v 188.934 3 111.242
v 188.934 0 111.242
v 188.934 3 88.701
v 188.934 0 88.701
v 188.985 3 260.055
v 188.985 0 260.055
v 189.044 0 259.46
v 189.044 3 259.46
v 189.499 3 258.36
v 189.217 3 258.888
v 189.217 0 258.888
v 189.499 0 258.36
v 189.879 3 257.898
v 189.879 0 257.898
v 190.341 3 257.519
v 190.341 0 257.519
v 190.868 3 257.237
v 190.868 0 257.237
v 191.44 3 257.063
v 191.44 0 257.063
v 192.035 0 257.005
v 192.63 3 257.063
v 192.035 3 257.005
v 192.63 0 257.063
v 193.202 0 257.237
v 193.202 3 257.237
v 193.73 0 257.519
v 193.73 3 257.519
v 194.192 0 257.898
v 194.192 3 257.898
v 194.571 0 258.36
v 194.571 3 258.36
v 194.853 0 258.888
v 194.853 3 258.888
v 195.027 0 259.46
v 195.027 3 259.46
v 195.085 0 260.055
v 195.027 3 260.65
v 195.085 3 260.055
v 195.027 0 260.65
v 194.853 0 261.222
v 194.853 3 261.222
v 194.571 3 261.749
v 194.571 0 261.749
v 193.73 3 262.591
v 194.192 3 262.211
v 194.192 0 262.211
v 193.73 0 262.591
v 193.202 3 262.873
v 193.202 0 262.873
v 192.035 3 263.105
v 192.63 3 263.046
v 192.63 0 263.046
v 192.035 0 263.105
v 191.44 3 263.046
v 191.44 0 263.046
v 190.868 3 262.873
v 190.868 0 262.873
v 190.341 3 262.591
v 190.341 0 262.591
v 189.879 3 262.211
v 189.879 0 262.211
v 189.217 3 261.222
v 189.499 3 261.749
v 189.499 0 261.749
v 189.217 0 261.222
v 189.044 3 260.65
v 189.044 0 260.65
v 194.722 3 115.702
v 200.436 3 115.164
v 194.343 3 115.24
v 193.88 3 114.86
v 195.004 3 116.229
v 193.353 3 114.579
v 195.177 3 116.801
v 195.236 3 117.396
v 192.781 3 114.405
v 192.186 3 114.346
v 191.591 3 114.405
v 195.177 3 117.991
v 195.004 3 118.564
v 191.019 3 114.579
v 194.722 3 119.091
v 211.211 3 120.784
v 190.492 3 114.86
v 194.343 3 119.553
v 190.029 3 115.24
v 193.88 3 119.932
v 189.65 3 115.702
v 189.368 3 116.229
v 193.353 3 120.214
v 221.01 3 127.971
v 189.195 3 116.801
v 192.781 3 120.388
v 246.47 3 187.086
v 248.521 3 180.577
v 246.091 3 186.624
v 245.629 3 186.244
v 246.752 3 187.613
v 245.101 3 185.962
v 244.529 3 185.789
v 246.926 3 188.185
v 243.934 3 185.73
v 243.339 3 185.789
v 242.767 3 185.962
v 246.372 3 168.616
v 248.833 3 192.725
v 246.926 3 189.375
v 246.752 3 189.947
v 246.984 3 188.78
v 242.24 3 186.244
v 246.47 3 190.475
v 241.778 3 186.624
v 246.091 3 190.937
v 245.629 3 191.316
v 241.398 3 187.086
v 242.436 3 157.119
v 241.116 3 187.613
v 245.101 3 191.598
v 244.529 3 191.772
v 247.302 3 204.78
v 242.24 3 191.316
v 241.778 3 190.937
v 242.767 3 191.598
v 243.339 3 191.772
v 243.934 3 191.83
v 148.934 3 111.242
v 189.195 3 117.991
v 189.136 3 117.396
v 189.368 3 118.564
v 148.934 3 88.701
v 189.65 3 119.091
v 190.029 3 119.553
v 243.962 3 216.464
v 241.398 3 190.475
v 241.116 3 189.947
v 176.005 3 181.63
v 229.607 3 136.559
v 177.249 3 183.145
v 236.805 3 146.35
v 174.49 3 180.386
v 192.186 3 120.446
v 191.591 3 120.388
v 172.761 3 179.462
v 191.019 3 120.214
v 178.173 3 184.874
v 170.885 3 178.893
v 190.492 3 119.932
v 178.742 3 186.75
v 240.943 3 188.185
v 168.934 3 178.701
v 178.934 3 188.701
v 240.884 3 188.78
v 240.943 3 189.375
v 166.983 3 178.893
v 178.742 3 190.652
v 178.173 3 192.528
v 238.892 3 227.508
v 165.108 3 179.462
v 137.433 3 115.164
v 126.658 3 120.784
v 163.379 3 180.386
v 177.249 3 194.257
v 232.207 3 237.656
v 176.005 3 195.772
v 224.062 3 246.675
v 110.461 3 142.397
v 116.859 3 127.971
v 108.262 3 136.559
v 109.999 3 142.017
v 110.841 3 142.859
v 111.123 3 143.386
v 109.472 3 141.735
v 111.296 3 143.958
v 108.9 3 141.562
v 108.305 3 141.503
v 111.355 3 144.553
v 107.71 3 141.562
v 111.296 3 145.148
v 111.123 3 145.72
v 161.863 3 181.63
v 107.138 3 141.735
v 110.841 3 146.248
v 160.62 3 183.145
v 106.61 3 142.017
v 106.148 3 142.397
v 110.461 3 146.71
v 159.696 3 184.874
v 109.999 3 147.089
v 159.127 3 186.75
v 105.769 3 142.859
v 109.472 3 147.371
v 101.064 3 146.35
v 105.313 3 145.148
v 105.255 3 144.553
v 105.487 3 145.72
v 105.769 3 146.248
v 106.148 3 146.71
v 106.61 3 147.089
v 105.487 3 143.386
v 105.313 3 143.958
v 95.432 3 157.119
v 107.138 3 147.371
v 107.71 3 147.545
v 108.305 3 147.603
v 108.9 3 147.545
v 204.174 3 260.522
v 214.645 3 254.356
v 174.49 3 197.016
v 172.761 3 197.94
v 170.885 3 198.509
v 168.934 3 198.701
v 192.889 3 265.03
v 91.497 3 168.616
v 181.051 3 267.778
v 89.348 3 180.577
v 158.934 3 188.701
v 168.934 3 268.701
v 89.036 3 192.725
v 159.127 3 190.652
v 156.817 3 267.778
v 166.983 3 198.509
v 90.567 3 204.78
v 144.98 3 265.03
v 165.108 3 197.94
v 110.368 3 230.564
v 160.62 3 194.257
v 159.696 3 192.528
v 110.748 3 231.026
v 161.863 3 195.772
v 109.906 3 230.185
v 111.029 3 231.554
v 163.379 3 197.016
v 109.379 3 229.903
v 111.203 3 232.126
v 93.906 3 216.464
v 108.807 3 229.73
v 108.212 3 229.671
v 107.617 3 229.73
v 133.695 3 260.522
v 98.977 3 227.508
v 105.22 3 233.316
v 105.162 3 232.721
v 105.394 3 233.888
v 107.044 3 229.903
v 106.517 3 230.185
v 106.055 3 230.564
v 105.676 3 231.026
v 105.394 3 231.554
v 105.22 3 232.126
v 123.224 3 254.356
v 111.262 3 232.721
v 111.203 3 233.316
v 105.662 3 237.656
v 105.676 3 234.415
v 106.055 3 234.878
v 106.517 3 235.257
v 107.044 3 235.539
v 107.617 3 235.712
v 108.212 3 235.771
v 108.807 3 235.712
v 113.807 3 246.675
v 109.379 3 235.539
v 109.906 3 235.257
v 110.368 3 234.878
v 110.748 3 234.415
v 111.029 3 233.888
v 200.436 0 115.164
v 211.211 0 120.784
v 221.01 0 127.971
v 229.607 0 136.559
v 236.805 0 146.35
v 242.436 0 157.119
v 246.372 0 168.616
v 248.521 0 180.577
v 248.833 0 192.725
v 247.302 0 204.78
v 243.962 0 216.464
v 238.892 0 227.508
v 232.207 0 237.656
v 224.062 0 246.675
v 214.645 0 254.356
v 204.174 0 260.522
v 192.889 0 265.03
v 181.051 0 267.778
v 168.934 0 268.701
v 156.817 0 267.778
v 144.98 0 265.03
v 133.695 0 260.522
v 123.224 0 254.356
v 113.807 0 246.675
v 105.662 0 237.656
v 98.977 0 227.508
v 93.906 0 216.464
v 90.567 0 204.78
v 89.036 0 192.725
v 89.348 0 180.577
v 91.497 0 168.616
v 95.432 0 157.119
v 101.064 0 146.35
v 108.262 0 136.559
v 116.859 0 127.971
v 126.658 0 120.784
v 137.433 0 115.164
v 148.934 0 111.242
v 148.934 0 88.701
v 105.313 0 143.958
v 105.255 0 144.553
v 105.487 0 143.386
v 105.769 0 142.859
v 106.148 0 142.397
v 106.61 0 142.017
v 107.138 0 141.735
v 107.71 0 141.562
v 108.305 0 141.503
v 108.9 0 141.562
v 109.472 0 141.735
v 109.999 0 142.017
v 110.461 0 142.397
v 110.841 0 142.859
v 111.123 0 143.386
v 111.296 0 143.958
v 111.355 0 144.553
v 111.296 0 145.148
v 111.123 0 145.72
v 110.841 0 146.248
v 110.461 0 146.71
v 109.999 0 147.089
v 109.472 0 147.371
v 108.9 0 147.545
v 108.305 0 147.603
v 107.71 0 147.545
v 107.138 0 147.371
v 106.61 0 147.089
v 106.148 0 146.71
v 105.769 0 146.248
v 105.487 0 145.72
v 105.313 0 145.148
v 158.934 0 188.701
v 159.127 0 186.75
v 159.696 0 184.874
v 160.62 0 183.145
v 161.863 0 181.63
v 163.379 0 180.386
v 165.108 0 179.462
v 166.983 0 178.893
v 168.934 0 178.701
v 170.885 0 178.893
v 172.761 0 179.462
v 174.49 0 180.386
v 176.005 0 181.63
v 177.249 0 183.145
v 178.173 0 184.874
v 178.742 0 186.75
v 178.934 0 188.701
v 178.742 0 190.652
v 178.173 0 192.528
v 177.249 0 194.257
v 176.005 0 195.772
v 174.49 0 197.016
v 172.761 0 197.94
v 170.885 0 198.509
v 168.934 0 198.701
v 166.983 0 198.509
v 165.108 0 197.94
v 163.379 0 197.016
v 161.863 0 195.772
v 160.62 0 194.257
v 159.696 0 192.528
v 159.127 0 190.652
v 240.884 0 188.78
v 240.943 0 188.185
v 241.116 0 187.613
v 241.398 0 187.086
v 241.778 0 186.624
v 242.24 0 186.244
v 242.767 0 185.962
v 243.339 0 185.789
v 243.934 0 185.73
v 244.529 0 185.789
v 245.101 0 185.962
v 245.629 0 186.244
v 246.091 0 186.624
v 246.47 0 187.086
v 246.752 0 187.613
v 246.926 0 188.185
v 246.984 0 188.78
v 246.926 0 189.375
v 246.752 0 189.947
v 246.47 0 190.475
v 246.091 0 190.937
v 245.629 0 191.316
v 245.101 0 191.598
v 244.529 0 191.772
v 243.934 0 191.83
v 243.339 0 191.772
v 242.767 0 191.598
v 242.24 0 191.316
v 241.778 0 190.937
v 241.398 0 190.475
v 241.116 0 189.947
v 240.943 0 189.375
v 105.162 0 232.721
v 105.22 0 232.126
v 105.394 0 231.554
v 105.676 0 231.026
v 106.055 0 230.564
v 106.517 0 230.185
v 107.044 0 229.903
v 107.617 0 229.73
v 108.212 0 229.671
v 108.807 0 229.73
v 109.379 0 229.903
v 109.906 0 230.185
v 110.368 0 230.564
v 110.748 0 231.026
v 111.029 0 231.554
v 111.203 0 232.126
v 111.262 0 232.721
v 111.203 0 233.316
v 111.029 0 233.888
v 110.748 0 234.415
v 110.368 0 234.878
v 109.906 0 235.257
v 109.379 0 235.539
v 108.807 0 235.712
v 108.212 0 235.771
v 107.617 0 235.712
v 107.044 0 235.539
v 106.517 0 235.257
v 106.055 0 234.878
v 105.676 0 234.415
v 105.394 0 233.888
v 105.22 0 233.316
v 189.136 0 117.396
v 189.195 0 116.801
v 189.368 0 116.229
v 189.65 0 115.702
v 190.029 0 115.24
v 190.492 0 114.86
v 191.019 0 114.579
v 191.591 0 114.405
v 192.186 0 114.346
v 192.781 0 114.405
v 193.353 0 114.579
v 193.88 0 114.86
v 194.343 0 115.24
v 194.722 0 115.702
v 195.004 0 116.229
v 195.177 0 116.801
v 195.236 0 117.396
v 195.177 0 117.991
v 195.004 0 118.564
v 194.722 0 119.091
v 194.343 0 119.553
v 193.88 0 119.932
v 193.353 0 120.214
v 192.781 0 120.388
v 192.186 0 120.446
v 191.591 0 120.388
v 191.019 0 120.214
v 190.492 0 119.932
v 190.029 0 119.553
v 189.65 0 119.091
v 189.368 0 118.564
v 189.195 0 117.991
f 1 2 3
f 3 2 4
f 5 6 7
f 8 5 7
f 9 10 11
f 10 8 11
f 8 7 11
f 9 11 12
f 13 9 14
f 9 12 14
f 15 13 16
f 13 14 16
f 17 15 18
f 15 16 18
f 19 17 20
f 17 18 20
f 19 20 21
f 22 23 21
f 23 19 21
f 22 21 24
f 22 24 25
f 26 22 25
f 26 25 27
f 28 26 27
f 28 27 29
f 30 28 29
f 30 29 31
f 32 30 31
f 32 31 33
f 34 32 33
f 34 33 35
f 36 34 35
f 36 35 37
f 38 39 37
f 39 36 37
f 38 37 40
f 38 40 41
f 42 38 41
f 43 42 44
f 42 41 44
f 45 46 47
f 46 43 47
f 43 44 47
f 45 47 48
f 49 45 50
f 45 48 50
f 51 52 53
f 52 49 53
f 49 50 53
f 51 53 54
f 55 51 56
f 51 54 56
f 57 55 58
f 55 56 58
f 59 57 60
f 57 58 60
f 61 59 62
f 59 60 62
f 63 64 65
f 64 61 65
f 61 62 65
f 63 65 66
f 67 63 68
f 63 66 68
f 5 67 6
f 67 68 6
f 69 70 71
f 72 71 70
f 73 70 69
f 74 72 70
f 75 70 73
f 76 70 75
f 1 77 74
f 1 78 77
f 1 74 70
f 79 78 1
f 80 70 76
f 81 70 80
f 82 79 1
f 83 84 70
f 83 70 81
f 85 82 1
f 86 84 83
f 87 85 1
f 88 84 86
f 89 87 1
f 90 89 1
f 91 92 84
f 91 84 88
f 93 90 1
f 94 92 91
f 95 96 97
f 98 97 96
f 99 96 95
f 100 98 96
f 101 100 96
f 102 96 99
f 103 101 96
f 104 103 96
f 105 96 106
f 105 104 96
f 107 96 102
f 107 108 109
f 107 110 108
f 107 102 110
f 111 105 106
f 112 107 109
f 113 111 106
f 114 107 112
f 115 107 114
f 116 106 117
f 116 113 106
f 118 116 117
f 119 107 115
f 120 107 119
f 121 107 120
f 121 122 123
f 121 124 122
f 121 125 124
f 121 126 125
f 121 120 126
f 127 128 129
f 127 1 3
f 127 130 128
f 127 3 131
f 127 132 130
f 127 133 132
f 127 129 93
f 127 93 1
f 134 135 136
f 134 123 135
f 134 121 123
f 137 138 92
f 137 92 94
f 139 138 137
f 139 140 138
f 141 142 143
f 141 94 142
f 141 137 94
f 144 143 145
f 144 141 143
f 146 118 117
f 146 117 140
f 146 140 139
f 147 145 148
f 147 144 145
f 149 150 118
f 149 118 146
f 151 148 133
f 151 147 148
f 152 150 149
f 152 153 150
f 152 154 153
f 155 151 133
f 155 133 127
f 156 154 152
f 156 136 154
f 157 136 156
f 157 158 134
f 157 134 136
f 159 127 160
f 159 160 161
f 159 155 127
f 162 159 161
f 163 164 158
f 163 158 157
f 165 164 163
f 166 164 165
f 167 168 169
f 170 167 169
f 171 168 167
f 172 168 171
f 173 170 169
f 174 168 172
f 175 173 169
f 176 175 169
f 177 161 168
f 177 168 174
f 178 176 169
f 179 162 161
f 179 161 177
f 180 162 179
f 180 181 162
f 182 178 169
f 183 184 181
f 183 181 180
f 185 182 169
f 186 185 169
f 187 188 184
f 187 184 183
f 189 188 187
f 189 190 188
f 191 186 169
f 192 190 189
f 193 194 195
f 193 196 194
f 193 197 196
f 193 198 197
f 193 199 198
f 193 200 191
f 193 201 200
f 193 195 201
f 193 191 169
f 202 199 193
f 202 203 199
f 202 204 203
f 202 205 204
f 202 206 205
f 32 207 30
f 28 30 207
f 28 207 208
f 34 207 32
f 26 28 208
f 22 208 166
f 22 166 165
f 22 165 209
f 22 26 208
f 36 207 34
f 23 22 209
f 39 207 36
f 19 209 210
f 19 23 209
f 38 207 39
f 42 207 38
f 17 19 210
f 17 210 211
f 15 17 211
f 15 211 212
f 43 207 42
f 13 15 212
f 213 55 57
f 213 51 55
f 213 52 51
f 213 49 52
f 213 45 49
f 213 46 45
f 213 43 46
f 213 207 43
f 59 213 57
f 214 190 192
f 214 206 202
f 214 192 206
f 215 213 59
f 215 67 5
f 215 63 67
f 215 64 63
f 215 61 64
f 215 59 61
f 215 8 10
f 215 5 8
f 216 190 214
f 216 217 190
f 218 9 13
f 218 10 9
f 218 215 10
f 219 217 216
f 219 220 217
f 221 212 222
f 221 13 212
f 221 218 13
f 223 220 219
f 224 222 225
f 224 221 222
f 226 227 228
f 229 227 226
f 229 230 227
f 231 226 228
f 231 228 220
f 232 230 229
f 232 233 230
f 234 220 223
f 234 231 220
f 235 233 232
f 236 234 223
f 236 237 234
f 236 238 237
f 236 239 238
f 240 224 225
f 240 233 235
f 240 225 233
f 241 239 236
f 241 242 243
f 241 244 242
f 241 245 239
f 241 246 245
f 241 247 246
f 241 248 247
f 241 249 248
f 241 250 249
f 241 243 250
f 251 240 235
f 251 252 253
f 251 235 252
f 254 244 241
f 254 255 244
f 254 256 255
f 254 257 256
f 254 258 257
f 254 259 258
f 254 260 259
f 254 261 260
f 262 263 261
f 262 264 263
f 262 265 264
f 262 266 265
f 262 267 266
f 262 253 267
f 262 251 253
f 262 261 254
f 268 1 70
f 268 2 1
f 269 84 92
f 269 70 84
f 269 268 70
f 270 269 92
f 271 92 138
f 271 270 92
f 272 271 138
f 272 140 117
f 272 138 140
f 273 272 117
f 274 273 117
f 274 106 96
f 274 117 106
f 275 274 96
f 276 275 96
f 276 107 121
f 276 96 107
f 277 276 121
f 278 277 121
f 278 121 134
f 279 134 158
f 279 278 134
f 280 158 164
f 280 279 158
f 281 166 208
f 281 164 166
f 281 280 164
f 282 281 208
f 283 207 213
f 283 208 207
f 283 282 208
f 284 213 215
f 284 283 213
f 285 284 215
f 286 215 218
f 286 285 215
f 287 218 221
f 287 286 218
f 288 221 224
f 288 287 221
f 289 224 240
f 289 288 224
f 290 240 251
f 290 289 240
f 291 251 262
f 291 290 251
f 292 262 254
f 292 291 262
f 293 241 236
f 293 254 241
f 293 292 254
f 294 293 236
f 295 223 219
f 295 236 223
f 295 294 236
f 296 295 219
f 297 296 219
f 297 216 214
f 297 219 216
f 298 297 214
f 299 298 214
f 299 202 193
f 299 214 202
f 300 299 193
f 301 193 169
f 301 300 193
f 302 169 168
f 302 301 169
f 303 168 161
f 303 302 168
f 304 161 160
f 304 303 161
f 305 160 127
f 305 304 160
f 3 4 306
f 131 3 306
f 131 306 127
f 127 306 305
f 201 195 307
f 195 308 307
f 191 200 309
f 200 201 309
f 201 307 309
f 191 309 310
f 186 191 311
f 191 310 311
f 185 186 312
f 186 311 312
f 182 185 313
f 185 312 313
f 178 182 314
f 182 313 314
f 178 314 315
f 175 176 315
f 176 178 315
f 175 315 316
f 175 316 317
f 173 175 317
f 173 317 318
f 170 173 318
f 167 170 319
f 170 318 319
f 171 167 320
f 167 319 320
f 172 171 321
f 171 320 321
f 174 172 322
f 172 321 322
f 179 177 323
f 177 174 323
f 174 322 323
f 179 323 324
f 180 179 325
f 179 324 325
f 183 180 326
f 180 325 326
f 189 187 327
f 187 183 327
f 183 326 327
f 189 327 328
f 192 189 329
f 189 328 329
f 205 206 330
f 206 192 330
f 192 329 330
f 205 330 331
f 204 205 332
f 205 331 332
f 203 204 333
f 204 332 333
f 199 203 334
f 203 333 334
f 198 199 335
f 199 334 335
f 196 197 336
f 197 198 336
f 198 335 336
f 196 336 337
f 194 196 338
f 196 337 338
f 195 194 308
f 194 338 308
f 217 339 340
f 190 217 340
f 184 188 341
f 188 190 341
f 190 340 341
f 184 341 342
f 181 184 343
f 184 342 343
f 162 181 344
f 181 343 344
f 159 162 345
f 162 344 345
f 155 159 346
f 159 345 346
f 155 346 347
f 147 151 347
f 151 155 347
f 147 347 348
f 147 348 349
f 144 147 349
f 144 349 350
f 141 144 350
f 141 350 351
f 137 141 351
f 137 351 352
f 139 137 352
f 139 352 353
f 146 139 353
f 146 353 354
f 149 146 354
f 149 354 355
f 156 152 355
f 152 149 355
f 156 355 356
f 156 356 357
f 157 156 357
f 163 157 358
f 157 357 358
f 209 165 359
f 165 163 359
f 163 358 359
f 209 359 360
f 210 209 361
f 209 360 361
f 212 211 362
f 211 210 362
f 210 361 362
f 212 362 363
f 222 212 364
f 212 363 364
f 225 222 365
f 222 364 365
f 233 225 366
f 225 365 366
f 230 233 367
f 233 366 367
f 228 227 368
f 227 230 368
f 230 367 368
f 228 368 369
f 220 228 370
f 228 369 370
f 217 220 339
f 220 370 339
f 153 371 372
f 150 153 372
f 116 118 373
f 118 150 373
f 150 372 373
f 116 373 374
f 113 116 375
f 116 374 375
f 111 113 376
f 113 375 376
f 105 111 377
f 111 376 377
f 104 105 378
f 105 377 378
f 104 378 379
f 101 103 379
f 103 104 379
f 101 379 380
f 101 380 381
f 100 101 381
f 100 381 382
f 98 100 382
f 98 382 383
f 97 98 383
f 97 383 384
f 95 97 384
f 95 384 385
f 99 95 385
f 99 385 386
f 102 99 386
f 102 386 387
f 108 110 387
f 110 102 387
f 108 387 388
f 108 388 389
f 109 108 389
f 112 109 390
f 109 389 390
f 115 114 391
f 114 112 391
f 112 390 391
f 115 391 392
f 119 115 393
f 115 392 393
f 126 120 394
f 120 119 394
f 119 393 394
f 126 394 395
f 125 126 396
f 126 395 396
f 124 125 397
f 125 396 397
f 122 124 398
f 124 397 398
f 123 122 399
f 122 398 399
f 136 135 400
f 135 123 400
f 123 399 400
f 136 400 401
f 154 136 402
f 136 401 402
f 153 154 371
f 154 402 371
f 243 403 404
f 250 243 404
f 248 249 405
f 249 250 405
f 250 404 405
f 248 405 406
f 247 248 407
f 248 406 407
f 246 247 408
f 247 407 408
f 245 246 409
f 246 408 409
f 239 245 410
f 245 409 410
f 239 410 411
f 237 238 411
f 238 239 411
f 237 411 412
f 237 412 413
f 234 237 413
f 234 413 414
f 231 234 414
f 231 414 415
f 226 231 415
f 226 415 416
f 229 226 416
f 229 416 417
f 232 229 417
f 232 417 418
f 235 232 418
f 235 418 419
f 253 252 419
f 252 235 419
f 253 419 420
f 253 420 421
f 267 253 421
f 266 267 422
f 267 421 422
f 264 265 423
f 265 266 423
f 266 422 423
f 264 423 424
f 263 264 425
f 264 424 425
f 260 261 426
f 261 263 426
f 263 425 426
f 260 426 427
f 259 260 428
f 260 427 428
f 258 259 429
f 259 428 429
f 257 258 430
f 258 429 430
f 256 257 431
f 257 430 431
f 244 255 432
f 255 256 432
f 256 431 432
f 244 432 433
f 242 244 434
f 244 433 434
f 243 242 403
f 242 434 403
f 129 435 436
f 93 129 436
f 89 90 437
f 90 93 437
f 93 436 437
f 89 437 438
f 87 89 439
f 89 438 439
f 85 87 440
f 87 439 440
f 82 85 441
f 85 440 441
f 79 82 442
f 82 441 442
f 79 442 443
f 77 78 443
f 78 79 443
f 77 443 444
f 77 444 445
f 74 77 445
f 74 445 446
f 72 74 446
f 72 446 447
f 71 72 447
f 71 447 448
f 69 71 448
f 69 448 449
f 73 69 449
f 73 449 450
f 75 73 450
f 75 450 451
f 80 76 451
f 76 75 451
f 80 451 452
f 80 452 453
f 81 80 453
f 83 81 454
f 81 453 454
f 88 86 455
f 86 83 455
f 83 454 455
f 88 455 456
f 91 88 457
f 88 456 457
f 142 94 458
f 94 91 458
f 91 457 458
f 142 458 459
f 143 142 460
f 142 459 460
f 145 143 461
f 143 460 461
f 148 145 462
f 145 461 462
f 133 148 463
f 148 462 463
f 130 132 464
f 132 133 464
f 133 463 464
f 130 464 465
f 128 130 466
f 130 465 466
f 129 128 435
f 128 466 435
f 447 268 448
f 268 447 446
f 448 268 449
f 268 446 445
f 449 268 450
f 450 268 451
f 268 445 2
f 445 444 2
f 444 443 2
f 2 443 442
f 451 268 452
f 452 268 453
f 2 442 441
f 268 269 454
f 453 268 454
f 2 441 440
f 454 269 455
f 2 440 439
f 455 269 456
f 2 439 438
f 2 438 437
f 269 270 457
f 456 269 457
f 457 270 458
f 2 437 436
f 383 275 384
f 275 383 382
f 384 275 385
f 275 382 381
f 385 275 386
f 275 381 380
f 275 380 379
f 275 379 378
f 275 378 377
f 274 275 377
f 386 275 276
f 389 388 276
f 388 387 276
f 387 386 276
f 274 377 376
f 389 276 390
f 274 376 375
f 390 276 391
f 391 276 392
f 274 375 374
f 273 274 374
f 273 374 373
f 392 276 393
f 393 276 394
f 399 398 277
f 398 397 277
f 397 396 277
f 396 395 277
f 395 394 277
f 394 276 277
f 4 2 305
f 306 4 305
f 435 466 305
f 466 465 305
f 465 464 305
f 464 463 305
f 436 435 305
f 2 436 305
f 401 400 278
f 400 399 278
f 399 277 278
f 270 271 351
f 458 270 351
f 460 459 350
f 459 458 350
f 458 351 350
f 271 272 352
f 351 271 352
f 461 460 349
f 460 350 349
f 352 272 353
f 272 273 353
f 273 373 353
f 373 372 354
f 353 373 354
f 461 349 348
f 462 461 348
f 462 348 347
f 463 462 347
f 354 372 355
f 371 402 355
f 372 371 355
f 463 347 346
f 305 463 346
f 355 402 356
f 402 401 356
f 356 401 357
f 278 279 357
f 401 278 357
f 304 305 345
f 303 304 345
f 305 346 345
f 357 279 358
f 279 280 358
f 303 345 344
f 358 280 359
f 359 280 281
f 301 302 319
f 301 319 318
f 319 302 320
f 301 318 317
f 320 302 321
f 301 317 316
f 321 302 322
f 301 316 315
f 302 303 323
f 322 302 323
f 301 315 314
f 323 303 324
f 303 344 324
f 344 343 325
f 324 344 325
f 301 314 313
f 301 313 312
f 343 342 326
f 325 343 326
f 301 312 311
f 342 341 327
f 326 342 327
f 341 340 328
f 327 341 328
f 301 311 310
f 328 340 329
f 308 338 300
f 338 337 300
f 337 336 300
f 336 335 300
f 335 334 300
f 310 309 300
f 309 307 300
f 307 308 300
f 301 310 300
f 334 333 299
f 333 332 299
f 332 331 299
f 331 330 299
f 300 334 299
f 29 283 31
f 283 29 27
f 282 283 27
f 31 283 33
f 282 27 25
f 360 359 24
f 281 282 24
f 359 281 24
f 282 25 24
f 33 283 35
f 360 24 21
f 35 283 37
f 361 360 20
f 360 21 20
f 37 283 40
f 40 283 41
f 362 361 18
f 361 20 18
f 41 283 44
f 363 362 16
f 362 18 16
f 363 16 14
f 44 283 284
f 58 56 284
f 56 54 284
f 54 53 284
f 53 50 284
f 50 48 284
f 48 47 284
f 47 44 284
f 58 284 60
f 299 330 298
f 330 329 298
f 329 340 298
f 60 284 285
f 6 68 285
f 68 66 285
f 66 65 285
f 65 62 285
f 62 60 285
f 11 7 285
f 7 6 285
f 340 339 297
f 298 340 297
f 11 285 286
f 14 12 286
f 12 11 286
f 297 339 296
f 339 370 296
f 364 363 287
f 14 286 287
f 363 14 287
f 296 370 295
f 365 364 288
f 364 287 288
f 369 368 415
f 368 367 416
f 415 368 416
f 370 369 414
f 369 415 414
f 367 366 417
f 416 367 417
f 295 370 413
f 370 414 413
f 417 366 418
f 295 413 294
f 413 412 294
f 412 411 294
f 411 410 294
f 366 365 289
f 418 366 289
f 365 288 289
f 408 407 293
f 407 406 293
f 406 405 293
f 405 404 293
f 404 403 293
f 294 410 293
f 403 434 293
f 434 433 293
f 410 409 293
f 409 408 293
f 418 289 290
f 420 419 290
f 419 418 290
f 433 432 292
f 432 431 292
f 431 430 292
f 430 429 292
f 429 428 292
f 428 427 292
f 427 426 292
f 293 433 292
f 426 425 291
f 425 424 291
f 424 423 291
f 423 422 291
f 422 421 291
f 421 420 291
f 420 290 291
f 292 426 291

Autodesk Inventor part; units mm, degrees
ref_plane "YZ Plane" through (0, 0, 0) normal (1, 0, 0) x (0, 1, 0)
ref_plane "XZ Plane" through (0, 0, 0) normal (0, 1, 0) x (-1, 0, 0)
ref_plane "XY Plane" through (0, 0, 0) normal (0, 0, 1) x (1, 0, 0)
sketch "Эскиз1" plane through (0, 0, 0) normal (0, 1, 0) x (-1, 0, 0)
  circle A0 centre (-168.9344, 188.7011) radius 75 construction
  circle A1 centre (-108.2116, 232.7209) radius 3.05
  circle A2 centre (-192.0353, 260.0548) radius 3.05
  circle A3 centre (-243.9343, 188.7803) radius 3.05
  circle A4 centre (-192.186, 117.3964) radius 3.05
  circle A5 centre (-108.3047, 144.5532) radius 3.05
  arc A6 (-148.9344, 111.2415) -> (-188.9344, 111.2415) centre (-168.9344, 188.7011) ccw
  line L0 (-188.9344, 88.7011) -> (-148.9344, 88.7011)
  line L1 (-148.9344, 88.7011) -> (-148.9344, 111.2415)
  line L2 (-188.9344, 111.2415) -> (-188.9344, 88.7011)
  circle A7 centre (-168.9344, 188.7011) radius 10
  point P0 (0, 0)
  dimension "d4" = 150
  dimension "d5" = 6.1
  dimension "d8" = 360
  dimension "d10" = 160
  dimension "d13" = 20
  dimension "d14" = 40
  dimension "d15" = 100
  dimension "d16" = 20
extrude "Выдавливание1" add sketch "Эскиз1" along normal blind 3
equation "\"d5\" = d_main_screw_holes"
equation "\"d13\" = 0.5 * hight_coxa"
equation "\"d14\" = hight_coxa"
equation "\"d15\" = length_coxa"
equation "\"d16\" = d_main_shaft"
equation "\"d2\" = thickness_steel"
equation "\"tolerance_plazma\" = 0.1"
equation "\"thickness_steel\" = 3"
equation "\"d_main_screw_holes\" = 6.1"
equation "\"d_main_shaft\" = 20"
equation "\"thickness_profile_tibea\" = 3"
equation "\"hight_shaft_shift\" = 37"
equation "\"thickness_profile_femur\" = 3"
equation "\"width_shaft_shift\" = 35"
equation "\"width_flattened_surface\" = 12"
equation "\"length_coxa\" = 100"
equation "\"hight_coxa\" = 40"
properties part number "femur_motor_steel" material "Сталь"
